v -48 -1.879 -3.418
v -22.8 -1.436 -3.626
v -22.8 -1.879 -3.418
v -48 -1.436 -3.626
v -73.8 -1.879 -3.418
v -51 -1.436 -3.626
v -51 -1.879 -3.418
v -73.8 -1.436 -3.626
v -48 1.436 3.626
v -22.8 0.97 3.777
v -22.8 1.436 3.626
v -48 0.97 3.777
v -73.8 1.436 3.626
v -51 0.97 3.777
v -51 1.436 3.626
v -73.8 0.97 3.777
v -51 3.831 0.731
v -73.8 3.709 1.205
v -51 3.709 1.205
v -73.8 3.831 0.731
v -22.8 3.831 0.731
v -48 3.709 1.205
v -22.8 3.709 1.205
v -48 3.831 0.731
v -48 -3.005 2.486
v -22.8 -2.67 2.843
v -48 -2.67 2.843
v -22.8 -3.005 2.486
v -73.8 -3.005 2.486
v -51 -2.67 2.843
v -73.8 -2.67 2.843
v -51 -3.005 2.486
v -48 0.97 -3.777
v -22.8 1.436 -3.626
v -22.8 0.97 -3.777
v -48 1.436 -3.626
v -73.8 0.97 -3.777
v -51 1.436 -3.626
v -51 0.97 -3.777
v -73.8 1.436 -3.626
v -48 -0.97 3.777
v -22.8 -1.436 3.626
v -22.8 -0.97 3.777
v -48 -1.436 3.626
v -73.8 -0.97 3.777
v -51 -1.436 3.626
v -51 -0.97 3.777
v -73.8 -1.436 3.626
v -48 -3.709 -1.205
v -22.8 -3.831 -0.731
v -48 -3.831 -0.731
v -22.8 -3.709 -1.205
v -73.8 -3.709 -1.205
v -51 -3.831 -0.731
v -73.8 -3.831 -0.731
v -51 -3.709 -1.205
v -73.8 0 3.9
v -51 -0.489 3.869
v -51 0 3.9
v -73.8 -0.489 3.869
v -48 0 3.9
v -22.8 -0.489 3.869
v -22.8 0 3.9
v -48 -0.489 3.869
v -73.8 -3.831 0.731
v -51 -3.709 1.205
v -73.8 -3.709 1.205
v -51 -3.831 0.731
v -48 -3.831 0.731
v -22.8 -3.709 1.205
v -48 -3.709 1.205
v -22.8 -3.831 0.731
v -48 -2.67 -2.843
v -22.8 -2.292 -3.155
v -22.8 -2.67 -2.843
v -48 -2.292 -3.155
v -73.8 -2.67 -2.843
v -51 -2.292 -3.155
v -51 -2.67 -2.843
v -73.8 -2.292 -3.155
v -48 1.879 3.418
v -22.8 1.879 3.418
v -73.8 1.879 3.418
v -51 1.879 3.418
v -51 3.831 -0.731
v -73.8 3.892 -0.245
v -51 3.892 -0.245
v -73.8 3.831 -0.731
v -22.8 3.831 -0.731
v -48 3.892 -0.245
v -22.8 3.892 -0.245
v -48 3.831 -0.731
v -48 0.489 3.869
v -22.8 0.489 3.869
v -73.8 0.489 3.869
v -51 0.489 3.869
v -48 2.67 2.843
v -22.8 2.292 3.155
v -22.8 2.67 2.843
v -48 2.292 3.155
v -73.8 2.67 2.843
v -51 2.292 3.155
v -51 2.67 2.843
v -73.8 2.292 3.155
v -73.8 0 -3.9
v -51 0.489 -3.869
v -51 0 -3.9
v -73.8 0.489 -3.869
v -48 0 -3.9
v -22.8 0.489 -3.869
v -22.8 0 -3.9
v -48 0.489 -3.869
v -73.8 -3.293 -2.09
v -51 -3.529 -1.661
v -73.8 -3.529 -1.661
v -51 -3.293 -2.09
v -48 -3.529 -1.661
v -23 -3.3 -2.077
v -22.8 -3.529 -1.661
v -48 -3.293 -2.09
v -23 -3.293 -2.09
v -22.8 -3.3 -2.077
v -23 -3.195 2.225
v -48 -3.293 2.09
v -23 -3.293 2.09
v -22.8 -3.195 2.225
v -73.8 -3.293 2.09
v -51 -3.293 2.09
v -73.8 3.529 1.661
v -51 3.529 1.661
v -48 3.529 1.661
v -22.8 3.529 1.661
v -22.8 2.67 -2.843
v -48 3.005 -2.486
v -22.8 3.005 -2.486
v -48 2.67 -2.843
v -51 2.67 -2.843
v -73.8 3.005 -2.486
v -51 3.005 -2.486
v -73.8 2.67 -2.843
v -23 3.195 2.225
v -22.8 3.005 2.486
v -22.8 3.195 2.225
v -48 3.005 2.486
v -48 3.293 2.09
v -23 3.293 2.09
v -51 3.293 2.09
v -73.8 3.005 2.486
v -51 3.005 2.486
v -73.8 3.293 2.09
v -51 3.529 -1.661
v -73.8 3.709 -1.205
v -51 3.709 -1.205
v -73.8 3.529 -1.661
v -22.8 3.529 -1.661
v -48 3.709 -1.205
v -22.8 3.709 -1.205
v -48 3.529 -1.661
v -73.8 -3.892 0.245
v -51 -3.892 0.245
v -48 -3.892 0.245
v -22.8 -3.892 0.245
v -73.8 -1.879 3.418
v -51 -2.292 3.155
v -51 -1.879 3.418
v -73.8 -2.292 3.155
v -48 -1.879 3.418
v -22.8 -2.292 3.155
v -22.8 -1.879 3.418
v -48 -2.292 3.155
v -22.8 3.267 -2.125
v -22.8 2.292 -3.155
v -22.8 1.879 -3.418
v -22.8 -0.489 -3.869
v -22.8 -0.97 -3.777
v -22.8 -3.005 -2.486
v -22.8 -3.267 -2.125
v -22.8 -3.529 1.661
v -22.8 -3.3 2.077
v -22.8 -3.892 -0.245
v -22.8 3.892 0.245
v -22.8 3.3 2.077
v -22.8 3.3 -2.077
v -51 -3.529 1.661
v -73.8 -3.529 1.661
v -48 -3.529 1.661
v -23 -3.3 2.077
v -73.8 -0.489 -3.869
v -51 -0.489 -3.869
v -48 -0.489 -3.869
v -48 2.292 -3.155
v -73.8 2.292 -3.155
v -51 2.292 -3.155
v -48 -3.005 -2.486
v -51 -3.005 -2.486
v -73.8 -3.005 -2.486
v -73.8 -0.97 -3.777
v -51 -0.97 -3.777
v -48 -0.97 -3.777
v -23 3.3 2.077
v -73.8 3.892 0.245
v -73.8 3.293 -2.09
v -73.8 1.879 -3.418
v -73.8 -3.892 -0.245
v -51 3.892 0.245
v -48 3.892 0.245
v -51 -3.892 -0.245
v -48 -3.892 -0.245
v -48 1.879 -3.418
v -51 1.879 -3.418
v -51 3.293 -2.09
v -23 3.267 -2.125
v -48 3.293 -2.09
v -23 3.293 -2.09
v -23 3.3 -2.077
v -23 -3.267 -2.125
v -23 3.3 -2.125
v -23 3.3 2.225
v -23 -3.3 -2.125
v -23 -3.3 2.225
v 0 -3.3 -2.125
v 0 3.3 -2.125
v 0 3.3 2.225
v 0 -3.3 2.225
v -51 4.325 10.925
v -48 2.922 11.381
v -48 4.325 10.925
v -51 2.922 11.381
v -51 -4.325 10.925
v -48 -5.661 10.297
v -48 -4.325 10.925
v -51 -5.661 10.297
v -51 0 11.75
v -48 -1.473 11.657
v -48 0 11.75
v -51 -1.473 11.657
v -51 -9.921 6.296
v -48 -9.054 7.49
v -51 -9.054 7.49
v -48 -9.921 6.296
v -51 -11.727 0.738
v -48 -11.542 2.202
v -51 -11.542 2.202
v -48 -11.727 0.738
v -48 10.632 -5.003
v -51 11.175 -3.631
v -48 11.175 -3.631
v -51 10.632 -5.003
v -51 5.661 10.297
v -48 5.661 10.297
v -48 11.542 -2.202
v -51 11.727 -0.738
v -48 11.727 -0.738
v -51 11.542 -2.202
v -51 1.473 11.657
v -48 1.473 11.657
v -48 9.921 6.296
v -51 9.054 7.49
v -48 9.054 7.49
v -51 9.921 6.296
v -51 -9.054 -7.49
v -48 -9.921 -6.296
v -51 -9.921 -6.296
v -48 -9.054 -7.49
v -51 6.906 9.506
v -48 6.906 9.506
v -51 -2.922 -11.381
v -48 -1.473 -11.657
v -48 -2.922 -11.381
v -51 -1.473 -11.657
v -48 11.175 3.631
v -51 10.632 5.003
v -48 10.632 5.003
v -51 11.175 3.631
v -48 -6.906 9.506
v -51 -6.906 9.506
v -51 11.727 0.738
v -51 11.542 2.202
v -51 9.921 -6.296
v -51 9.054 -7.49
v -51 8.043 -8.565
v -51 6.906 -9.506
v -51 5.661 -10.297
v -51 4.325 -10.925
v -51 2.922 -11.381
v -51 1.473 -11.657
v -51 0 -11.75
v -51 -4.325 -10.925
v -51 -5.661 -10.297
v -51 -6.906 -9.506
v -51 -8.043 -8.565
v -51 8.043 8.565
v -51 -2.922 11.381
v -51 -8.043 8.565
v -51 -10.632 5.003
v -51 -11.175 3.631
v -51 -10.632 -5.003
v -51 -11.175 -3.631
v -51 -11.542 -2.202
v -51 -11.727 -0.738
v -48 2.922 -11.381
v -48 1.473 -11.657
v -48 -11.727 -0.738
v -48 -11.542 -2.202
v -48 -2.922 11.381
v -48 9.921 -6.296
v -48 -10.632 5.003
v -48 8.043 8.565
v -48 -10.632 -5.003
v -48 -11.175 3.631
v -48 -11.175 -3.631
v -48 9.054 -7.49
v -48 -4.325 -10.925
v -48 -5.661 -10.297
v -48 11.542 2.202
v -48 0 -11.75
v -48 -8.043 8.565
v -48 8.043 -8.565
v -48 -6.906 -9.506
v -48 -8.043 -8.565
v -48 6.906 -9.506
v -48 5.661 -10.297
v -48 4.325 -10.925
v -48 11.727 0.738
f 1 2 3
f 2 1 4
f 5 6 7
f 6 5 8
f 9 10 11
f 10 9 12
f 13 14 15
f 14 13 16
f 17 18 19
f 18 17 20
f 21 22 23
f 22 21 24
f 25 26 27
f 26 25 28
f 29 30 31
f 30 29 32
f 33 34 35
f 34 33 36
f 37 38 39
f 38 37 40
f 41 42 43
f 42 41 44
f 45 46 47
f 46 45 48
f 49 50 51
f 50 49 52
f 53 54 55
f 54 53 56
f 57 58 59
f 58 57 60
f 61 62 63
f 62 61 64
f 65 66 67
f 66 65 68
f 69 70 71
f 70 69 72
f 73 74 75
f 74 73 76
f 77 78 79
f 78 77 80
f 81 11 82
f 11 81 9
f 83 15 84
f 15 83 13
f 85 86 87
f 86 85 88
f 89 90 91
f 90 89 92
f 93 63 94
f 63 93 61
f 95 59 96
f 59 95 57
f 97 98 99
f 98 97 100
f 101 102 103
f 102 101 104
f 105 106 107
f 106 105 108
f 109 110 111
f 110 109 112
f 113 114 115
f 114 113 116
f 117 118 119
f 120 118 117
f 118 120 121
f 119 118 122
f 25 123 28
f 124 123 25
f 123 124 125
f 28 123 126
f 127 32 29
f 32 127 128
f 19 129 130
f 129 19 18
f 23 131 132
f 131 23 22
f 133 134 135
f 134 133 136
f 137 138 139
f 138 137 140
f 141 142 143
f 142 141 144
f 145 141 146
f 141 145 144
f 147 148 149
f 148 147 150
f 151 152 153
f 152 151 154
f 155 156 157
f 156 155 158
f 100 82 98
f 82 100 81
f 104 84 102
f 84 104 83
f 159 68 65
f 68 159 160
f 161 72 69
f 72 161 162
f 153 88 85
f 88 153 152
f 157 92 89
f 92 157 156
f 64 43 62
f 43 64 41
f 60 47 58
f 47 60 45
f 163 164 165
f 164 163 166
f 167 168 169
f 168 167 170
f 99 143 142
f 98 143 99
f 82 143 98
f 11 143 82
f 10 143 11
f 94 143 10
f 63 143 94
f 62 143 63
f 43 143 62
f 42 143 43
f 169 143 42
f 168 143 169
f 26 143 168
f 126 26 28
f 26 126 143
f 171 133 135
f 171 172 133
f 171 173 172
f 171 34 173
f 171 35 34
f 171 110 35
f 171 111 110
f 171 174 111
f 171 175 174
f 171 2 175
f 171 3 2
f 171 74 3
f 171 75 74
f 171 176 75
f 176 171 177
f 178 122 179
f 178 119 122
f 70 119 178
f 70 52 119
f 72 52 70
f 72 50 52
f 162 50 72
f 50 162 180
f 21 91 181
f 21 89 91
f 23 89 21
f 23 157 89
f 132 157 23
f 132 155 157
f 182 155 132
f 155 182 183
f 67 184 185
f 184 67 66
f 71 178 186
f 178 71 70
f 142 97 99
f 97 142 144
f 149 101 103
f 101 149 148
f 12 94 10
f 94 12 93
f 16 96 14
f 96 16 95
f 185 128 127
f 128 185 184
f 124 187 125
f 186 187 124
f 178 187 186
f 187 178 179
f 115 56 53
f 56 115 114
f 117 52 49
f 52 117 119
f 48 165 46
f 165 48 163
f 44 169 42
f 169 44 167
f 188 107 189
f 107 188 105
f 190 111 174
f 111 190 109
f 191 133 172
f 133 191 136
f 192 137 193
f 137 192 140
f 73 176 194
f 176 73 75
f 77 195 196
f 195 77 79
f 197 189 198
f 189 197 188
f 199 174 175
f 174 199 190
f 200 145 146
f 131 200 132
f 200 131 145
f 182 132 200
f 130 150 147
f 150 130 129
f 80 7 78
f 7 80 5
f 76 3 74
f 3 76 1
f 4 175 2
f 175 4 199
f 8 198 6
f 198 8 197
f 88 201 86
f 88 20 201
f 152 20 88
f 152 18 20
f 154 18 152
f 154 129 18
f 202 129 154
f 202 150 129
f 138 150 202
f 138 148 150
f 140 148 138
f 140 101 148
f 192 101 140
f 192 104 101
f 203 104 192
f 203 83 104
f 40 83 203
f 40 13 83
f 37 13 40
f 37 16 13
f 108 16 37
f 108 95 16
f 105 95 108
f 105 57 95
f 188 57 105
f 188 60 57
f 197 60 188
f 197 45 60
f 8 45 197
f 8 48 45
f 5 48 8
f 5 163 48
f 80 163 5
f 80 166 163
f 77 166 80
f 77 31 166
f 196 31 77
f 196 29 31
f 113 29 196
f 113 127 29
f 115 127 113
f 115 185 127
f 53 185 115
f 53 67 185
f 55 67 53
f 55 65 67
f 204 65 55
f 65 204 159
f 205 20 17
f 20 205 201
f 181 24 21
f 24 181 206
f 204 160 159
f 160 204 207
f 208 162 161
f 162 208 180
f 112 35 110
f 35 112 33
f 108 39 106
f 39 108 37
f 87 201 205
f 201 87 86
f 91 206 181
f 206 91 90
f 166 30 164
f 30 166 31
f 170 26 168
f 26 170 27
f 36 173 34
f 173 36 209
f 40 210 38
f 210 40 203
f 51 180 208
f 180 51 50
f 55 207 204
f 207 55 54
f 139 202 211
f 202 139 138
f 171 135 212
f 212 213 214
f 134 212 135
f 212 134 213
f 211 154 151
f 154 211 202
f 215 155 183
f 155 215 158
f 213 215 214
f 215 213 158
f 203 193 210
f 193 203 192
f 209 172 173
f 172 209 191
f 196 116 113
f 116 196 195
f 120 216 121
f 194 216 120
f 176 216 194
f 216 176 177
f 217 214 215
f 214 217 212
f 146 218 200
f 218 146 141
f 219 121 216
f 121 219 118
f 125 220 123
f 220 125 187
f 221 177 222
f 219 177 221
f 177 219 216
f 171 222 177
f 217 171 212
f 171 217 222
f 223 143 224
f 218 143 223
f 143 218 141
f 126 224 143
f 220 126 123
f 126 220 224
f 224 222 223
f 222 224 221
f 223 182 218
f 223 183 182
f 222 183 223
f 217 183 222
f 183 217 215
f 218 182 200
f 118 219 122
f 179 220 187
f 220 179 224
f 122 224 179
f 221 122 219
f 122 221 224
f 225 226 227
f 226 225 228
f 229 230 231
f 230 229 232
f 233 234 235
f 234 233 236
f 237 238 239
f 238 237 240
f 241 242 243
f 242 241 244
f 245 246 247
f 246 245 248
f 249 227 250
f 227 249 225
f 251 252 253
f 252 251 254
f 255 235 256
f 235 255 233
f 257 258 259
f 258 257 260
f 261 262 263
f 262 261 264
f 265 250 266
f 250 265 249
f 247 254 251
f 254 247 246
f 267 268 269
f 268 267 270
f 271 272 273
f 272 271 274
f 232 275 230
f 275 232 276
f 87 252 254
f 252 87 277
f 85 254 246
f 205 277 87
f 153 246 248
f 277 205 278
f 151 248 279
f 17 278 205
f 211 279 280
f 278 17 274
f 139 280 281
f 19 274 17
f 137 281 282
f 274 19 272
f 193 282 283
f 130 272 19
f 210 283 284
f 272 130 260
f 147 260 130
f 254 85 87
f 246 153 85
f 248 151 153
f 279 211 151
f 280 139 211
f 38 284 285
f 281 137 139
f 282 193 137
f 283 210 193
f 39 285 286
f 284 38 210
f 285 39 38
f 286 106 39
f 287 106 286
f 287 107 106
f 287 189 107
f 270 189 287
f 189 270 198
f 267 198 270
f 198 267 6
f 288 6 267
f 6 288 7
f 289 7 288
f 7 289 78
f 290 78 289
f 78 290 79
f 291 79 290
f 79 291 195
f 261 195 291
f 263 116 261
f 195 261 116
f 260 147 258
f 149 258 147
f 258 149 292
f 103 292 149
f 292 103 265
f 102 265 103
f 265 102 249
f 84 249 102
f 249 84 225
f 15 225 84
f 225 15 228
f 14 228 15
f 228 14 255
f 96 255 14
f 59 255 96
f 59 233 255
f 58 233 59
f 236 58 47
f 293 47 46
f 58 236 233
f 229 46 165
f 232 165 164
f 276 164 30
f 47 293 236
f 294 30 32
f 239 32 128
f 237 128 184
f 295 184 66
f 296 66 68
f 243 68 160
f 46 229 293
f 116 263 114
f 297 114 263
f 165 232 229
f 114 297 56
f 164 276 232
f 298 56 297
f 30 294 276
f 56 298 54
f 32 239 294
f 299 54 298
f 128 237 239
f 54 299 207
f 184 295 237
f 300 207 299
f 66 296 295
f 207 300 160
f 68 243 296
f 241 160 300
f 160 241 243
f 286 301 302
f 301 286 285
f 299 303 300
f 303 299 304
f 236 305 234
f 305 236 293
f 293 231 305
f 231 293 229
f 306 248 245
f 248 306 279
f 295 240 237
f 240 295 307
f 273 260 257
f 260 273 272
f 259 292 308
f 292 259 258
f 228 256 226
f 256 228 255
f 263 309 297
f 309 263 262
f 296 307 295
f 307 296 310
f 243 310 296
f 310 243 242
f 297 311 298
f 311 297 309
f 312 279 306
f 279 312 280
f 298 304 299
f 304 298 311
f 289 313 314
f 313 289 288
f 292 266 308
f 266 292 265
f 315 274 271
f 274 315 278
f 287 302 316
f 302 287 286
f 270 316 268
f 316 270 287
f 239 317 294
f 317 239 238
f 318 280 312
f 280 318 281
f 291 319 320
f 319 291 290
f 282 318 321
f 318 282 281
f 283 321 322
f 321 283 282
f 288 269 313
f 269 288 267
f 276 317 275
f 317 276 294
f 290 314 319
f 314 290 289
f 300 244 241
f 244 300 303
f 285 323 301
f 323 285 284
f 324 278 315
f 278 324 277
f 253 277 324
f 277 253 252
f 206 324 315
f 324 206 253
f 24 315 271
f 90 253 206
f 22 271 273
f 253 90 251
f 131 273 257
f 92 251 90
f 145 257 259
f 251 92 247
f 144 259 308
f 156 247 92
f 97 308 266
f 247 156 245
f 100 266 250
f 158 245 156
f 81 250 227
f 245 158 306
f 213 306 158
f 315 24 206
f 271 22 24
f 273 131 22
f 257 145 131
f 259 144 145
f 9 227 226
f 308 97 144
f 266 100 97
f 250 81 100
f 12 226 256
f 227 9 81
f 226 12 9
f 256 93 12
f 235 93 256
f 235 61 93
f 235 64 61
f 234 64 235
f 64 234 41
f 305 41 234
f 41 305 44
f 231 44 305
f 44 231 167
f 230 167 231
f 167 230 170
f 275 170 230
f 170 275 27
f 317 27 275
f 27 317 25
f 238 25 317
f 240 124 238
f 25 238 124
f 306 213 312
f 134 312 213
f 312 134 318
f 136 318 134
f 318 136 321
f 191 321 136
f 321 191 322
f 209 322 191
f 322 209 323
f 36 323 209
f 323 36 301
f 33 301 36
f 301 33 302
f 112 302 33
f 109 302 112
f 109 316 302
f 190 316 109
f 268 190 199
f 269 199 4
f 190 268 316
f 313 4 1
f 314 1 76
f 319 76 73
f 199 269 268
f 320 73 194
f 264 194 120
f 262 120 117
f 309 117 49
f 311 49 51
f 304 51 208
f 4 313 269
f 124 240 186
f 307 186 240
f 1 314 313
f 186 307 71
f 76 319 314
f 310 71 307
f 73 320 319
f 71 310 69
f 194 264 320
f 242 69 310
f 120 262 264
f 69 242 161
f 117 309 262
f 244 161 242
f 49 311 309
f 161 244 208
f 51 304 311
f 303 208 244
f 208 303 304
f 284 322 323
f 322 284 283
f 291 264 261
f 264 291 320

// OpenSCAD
// file: ../robot_settings.scad
main_box_x = 95; // 96
main_box_y = 102;
main_box_z = 74; // 74.5
wall_thickness = 2;

rail_gap = 2;
rail_inset = 7;

rail_thickness = 7;
rail_length = 250;
rail_width = 200;

raspberry_pi_screw_seperation_y = 57;
raspberry_pi_screw_seperation_z = 48;
raspberry_pi_peg_h = 5;

battery_box_peg_h = 6;
battery_box_peg_d = 8;
battery_box_peg_cutout = 5;

gears_module = 1;
pinion_gear_teeth = 32;
pinion_gear_width = 5;
pinion_gear_bore = 8;

gears_setback_distance = 25;
gear_post_height = 2 * pinion_gear_width + rail_thickness + 8 ;

steering_motor_mount_x = 45;
steering_motor_mount_y = 36;
steering_motor_mount_z = 18;
steering_motor_mount_setback_distance = gears_setback_distance + 16;

dc_motor_drivertype = "Teyleten"; // Teyleten
isAdafruit = (dc_motor_drivertype == "Adafruit");

drv8871_x = isAdafruit ? 20.3 : 21.6;
drv8871_y = isAdafruit ?  24 : 25;

drv8871_z = 2;
drv8871_screw_d = 2.5;
drv8871_solder_points_z = 2;

drv8871mount_edge_x = 1.5;
drv8871mount_edge_wall = 3;
drv8871mount_z = 5;
drv8871mount_x = drv8871_x +  drv8871mount_edge_wall - 2* drv8871mount_edge_x;
drv8871mount_y = 19;

drv8871_screw_distance = 15.64;
drv8871_solder_points_d = 1.66;
drv8871_solder_offset_y = 4.4;
drv8871_solder_inner_points_distance = 5;
drv8871_solder_outer_points_distance = 12;

dc_motor_housing_minus_encoder_z = 48;
dc_motor_encoder_z = 9.33;
dc_motor_encoder_wheel_d = 13.4;
dc_motor_encoder_wheel_thickness = 5;
dc_motor_encoder_wheel_gap = 3;
dc_motor_encoder_circuit_thickness = 2;
dc_motor_cutout_d = 24.8;
dc_motor_cutout_z = 19.5;

dc_motor_screw_head_z = 2;
dc_motor_screw_head_d = 5.6;
dc_motor_screw_d = 3.2;
dc_motor_screw_offset = 8.5;

dc_motor_axle_ring_z = 3;
dc_motor_axle_ring_d = 7.2;
dc_motor_axle_cutout_d = 4.2;
dc_motor_axle_cutout_z = 10;
dc_motor_axle_notch_cutout = 0.4;
dc_motor_axle_notch_cutout_z = 6;

pdmount_x = 20;
pdmount_y = 30;
pdmount_z = 2;
pdmount_edge_x = 1.5;
pdmount_edge_wall = 3;

steering_shaft_z = 45;
steering_shaft_d = 7;
steering_shaft_motor_fitting_d = 9;
coupler_length = 24.6;
coupler_diameter = 14;
coupler_screw_d = 4;
coupler_screw_z_offset = 5;
coupler_gear_side_insert = 12.6;
steering_shaft_with_coupler_z = steering_shaft_z - coupler_gear_side_insert;

lidar_mount_y = 110;
lidar_mount_x = 65 + 20;
lidar_narrow_screws = 40;
lidar_wide_screws = 56;
lidar_front_to_back_screws = 70;
lidar_screw_d = 3;
lidar_circuitboard_x = 20;
lidar_circuitboard_y = 35;
lidar_circuitboard_z = 1.2;
lidar_cord_length = 29;

ball_bearing_height = 7;
ball_bearing_outer_diameter = 22;
ball_bearing_inner_diameter = 8;

M4_diameter = 5.1;
M3_diameter = 2.9;
M3_length = 35;
M3_cap_length= 3;
M3_cap_diameter = 5.44;

suspension_spring_outer_diameter = 8;
suspension_spring_inner_diameter = 5.3;

armature_holder_height = 20;
armature_holder_thickness = 8;
pull_bar_peg_r = 3.2;
apparatus_locking_peg_d = 4;

rack_module = 1;
rack_length = main_box_x;
rack_height = 5;
rack_width = 10;
rack_teeth = 30;
rack_bore = 3;

pull_bar_length = rail_width / 2 - rack_length + 1;

// tire hardware
axle_length = 44 + ball_bearing_height; 
axle_reciever_inner_diameter = 8.2;
axle_reciever_outer_diameter = 12;
axle_reciever_length = 18.8;
axle_notch_length = 15;
axle_notch_cutout = 2.4;

// power distribution bar
power_bar_cutout_x = 96;
power_bar_y = 19.1;
power_bar_z = 1.5;
power_bar_screw_distance = 91.4;
power_bar_screw_d = 2.8;
power_bar_standoff_z = 5;
power_bar_standoff_d = 6.83;

pico_expander_width = 63;
pico_expander_height = 57;
pico_screw_hole_offset = 3;
pico_screw_hole_d = 2.5;

usbhub_thickness = 11.7;
usbhub_depth = 37.5;
usbhub_width = 86.7;
usbhub_end_port_width = 14.8;
usbhub_end_port_height = 12;
usbhub_front_face_safe_zone_left = 15;
usbhub_front_face_safe_zone_right = 14.8;

switch_w = 16;
switch_cutout_d = 12.2;
switch_bump_h = 2;
switch_bump_l = 18.2;
// main file
include <../robot_settings.scad>

$fn=50;

module axle(
  axle_length = axle_length,
  axle_inner_radius = (axle_reciever_inner_diameter- 0.1) / 2,
  rotate = true,
  rear_axle = false
)
{  
   rotation = rotate ? 180 : 0;
      
  rotate([0,rotation,0])
  {  
      // inner axle
      difference() {
          // axle
          translate([axle_notch_length + 8 -.2, 0, 0])
         rotate([0,90,0])
         cylinder(axle_length, d = ball_bearing_inner_diameter - .2);
        
//          // axle notch
//          translate([-.1, -4, -axle_inner_radius - 2.5])
//            cube([axle_notch_length, 2 * axle_inner_radius, axle_inner_radius]);
//        
//          translate([-.1, -4,  axle_inner_radius / 2 + .4])
//            cube([axle_notch_length, 2 * axle_inner_radius, axle_inner_radius]);
        }
        
        translate([0, -7 / 2 + .2,  -axle_inner_radius / 2 - .2 ])
        cube([axle_notch_length + 8, 6.6, axle_inner_radius + .3]);
        
        // axle cap
        translate([axle_length - 11 + 8, 0, 0])
         rotate([0,90,0])
        cylinder(h = 3, d = ball_bearing_outer_diameter + 1.5);
    }
}
 
axle();
